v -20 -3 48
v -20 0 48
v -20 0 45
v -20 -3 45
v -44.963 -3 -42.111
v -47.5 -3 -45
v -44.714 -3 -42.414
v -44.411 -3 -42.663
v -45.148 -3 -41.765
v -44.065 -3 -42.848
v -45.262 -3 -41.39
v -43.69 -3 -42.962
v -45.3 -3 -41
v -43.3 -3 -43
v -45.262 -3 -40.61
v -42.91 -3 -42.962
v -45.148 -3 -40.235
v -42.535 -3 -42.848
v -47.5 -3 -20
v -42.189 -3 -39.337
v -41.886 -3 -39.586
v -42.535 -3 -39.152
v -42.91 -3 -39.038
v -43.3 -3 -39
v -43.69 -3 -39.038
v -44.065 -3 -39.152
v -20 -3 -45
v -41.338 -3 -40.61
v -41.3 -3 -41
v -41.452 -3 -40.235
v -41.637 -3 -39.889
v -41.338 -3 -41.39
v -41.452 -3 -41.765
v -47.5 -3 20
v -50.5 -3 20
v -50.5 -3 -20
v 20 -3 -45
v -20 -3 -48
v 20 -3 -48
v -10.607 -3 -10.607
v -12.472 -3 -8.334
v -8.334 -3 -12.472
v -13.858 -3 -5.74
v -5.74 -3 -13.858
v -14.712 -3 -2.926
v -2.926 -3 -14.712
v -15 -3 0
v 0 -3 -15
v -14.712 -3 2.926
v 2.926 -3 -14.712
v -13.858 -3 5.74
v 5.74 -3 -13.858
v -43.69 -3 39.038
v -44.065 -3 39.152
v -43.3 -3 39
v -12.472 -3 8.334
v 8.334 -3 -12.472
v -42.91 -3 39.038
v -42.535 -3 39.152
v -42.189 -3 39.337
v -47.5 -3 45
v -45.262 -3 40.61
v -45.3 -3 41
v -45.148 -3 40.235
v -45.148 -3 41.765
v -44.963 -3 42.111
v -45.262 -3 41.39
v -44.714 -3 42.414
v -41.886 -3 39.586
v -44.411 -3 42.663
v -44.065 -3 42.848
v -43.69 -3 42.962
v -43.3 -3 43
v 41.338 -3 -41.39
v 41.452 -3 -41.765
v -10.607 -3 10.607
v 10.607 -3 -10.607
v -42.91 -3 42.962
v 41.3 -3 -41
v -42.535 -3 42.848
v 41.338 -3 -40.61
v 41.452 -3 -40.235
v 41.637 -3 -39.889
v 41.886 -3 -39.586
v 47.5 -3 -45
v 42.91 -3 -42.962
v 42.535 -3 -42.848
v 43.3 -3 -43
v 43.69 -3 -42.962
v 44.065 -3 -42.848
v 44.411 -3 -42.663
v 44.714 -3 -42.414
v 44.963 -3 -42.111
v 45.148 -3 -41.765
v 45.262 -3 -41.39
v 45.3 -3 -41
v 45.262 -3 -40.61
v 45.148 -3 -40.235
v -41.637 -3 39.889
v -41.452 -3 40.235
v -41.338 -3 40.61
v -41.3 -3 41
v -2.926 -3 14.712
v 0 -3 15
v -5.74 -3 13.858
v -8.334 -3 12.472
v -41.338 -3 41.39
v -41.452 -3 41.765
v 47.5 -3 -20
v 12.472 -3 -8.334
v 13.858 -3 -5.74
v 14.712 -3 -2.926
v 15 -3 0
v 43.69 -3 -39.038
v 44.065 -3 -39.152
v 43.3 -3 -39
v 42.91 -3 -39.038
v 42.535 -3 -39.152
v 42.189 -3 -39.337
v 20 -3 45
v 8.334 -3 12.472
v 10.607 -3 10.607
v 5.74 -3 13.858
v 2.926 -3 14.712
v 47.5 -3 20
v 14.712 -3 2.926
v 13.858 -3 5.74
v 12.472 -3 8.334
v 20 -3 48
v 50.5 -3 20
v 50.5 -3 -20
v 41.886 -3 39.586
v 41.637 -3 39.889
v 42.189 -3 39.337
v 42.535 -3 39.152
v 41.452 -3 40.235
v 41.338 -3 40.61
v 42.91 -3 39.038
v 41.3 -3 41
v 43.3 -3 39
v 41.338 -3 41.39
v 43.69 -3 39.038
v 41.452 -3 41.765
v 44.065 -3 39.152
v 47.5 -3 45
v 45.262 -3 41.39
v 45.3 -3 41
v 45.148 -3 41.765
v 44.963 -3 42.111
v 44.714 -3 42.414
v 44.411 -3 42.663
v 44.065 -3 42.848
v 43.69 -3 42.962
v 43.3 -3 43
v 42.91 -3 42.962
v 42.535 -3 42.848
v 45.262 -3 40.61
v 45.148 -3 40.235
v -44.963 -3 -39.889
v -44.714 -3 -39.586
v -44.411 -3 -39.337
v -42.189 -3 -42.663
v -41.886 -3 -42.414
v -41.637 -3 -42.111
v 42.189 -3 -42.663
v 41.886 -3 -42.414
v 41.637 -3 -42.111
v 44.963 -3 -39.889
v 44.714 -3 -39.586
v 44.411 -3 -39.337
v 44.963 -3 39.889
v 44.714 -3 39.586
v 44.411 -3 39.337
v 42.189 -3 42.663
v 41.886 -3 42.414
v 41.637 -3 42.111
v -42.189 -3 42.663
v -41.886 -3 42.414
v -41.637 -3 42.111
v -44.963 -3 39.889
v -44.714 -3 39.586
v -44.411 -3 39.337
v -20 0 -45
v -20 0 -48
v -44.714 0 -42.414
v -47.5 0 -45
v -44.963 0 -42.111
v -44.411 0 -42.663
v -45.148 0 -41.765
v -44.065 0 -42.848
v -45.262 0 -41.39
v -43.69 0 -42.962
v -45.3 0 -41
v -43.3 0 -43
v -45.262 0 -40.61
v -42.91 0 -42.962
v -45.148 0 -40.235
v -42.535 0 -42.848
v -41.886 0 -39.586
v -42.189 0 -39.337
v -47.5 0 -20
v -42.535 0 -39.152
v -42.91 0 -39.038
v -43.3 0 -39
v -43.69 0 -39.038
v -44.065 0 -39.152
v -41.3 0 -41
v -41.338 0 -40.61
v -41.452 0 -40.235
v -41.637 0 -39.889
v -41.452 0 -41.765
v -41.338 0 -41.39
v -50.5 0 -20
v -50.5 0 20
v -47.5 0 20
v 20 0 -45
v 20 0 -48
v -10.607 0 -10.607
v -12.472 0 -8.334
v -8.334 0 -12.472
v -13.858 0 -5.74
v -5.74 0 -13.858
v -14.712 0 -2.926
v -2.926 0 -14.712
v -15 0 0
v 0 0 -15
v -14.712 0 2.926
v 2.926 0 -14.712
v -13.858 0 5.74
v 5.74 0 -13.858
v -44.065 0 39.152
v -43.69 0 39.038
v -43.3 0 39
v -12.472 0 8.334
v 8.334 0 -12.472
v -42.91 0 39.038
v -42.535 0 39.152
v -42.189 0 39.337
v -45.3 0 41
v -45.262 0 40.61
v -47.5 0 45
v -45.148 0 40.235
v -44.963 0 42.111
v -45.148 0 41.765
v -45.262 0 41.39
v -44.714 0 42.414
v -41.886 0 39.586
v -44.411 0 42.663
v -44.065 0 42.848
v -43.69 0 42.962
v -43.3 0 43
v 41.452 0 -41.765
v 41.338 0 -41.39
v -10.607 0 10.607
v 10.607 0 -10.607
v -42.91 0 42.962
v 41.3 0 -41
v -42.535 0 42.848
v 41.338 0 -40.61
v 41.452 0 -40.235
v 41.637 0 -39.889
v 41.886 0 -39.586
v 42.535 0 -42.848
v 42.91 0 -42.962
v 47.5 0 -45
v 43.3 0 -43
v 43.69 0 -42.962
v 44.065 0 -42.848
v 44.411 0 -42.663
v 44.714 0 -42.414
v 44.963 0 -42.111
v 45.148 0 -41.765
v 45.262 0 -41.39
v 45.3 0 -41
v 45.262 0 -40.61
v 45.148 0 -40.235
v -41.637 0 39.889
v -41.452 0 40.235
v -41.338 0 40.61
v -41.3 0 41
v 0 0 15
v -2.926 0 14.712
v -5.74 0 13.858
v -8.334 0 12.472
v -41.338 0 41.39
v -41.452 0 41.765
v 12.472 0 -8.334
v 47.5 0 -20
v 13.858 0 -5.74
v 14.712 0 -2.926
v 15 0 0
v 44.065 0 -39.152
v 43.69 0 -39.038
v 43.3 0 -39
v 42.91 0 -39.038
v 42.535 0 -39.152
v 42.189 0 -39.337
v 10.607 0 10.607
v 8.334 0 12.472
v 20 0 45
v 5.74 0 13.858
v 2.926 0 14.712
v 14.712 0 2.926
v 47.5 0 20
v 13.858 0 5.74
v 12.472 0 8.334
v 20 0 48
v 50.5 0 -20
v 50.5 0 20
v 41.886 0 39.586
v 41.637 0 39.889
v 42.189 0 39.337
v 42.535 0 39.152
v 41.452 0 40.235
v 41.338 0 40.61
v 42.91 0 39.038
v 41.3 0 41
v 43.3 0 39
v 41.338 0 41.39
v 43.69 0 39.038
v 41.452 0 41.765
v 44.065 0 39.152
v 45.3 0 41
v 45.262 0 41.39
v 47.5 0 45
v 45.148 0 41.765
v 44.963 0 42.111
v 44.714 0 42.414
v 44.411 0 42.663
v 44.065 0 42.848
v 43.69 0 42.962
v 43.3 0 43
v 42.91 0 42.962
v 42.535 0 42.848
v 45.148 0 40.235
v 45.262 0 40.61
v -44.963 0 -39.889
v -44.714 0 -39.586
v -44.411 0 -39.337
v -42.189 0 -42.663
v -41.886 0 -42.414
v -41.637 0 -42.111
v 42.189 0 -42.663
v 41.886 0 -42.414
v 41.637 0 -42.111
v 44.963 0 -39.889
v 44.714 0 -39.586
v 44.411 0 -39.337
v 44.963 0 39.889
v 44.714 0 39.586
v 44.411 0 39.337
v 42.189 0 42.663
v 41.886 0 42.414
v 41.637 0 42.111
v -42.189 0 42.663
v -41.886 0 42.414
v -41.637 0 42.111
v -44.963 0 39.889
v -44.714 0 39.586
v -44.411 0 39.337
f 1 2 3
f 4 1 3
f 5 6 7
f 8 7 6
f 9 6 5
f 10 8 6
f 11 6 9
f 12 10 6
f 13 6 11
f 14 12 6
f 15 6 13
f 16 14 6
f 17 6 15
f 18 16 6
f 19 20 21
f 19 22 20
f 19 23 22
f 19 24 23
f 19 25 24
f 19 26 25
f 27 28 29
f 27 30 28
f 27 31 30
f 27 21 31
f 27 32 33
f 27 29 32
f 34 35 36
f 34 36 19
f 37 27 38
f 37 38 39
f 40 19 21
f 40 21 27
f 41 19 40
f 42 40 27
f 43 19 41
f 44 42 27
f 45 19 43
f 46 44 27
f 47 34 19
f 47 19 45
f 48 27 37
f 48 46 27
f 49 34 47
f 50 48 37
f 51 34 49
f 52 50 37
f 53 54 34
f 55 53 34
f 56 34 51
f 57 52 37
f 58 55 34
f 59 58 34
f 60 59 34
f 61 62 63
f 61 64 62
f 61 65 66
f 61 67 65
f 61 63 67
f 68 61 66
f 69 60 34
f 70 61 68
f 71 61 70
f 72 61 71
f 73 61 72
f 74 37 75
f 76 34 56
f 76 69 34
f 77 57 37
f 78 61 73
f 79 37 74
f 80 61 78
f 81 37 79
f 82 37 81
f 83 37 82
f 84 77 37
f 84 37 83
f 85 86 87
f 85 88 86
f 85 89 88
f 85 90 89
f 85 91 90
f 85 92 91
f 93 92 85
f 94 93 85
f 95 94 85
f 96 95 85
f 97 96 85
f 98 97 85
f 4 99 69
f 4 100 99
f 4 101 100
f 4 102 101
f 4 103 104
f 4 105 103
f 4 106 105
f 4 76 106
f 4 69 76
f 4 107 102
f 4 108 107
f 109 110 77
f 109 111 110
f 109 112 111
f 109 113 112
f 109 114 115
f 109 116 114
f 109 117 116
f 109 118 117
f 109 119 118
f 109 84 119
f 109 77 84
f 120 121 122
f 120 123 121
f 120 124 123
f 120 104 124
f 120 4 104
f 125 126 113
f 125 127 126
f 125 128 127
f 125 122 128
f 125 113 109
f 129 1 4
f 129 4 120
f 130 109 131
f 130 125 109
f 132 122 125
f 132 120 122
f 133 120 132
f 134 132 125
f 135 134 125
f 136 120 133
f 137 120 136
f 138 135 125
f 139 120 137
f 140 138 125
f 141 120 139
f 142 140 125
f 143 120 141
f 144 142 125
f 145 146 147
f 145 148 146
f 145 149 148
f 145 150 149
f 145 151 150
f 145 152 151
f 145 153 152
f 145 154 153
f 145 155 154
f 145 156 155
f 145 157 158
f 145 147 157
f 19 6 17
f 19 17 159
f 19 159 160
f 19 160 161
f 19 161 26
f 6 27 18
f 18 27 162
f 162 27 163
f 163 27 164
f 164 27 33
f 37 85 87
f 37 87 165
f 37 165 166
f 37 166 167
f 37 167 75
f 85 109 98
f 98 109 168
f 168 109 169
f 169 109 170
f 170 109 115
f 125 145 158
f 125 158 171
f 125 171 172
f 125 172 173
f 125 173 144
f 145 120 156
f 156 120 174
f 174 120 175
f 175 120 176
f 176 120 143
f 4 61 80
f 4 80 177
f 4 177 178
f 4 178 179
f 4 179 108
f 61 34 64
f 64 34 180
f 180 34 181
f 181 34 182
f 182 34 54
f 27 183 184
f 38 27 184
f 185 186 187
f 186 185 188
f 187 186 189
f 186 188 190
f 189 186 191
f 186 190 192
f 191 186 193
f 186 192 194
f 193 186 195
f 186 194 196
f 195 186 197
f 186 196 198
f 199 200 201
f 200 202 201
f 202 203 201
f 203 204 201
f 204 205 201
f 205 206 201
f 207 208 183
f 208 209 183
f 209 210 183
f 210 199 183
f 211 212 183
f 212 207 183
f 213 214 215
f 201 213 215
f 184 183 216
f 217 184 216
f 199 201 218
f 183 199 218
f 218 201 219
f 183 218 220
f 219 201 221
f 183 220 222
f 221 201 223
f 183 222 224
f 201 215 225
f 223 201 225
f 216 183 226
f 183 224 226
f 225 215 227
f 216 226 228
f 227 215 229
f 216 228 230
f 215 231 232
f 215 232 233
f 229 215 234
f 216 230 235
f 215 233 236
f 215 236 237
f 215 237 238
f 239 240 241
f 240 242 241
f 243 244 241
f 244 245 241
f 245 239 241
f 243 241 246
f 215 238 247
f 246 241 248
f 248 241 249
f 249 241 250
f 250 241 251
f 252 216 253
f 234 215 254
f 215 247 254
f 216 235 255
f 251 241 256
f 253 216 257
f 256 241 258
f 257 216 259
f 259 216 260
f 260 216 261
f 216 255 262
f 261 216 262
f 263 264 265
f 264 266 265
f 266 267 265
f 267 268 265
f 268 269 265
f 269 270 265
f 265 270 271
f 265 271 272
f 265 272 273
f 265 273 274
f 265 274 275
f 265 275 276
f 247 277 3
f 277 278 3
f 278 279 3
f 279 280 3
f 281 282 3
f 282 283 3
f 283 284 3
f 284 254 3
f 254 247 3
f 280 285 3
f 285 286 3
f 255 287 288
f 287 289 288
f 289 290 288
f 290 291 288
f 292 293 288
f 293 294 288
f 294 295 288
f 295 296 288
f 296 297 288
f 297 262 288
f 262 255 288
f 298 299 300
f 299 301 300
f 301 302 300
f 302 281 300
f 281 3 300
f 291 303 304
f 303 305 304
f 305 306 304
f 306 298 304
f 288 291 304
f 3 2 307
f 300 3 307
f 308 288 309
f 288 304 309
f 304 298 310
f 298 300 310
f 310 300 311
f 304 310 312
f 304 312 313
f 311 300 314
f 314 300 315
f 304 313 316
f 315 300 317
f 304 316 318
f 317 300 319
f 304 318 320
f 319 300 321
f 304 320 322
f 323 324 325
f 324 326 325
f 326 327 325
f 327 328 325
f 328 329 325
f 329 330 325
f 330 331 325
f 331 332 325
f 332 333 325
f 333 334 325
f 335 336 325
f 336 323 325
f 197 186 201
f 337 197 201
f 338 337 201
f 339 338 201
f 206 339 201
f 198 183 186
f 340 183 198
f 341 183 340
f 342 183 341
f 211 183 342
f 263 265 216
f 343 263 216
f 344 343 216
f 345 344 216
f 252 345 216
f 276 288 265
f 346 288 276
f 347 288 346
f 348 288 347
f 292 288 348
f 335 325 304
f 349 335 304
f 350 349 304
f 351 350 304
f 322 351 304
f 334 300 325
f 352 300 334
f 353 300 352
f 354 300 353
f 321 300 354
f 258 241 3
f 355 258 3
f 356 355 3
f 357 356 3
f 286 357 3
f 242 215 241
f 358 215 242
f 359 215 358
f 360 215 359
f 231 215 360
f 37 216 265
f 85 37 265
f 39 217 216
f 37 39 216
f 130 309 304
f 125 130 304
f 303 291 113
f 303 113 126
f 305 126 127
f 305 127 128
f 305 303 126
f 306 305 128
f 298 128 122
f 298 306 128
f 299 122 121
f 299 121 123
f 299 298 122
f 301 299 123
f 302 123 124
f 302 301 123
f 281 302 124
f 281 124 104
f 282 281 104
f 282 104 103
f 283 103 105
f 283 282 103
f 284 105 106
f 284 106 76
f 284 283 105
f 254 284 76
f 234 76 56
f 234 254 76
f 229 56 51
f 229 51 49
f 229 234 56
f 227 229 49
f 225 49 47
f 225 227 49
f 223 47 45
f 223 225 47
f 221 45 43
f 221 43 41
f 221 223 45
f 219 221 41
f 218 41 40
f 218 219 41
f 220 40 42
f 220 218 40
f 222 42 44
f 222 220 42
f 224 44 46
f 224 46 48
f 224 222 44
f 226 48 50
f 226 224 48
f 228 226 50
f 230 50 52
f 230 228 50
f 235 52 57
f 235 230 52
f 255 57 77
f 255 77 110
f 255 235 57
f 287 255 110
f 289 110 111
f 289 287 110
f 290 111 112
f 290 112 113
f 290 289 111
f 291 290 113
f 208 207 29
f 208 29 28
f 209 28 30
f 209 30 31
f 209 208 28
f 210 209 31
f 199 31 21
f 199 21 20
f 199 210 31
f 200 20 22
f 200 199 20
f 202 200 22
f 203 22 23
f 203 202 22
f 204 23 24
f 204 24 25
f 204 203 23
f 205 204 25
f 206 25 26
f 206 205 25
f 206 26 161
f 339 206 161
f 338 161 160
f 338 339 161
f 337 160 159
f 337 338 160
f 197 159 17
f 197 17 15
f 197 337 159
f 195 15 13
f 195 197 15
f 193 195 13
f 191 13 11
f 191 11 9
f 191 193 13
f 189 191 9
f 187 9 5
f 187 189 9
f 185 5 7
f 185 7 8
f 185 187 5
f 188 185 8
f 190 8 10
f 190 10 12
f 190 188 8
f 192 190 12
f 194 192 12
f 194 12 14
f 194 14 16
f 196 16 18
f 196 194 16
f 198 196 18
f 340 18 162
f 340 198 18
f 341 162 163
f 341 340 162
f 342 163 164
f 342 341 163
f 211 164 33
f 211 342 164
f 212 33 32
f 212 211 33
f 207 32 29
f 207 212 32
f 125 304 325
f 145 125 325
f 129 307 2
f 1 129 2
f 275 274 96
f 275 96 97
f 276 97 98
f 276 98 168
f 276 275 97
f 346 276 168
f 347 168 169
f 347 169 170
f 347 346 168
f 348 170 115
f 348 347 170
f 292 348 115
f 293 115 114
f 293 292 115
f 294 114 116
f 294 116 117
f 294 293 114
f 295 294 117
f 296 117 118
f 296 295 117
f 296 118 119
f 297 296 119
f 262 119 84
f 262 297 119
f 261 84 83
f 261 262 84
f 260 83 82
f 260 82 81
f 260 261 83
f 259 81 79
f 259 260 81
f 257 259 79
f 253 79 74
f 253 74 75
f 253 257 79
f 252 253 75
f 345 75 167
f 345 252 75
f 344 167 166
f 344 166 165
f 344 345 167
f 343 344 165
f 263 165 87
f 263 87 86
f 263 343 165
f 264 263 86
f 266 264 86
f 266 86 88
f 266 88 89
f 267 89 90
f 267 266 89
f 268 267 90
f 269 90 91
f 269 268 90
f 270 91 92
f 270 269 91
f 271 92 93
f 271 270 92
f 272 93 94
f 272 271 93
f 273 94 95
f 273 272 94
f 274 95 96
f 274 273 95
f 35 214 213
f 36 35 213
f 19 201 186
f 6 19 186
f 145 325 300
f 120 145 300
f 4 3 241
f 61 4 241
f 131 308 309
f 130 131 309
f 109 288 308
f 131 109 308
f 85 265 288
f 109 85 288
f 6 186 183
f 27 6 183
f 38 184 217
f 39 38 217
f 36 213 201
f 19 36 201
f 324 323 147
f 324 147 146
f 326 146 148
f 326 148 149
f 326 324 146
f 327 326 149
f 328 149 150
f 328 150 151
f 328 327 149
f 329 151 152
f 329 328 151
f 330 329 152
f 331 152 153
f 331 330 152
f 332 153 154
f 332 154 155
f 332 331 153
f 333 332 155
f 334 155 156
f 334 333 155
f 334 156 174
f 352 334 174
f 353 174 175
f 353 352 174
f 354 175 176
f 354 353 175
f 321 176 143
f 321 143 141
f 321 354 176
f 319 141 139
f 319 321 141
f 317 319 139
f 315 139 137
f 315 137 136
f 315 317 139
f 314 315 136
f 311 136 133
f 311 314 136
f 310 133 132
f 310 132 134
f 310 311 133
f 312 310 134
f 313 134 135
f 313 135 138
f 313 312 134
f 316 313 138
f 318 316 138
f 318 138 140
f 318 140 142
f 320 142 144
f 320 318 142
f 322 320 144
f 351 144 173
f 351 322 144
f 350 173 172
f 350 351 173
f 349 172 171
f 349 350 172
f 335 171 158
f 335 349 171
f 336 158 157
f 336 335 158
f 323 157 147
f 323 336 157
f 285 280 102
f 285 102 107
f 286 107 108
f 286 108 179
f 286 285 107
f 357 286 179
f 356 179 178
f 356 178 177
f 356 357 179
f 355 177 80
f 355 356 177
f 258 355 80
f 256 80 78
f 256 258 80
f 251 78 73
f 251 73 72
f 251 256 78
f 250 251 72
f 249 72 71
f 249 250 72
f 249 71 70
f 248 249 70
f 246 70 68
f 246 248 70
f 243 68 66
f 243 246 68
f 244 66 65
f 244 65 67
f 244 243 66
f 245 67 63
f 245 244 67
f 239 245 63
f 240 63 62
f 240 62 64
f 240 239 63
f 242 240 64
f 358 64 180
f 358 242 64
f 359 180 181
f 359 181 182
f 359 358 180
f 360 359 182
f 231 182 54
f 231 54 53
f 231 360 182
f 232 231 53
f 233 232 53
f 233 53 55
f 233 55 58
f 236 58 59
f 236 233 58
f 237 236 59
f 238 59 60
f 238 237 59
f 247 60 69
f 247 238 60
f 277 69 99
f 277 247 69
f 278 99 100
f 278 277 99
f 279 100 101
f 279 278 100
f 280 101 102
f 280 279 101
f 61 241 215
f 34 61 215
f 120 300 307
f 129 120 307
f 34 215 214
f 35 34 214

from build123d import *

# Parameters (mm, degrees)
F0_R     = 2
F0_R_2   = 15
F1_DEPTH = 3


with BuildPart() as f1:
    # F0 (on Front) → F1 (new body)
    with BuildSketch(Plane.XZ):
        Polygon((-50.5, 20), (-50.5, 0), (-50.5, -20), (-47.5, -20), (-47.5, -45), (-20, -45), (-20, -48), (0, -48), (20, -48), (20, -45), (47.5, -45), (47.5, -20), (50.5, -20), (50.5, 0), (50.5, 20), (47.5, 20), (47.5, 45), (20, 45), (20, 48), (0, 48), (-20, 48), (-20, 45), (-47.5, 45), (-47.5, 20), align=None)
        with Locations((-43.3, -41)):
            Circle(F0_R, mode=Mode.SUBTRACT)
        with Locations((43.3, -41)):
            Circle(F0_R, mode=Mode.SUBTRACT)
        with Locations((-43.3, 41)):
            Circle(F0_R, mode=Mode.SUBTRACT)
        Circle(F0_R_2, mode=Mode.SUBTRACT)
        with Locations((43.3, 41)):
            Circle(F0_R, mode=Mode.SUBTRACT)
    extrude(amount=F1_DEPTH)


solid = f1.part
